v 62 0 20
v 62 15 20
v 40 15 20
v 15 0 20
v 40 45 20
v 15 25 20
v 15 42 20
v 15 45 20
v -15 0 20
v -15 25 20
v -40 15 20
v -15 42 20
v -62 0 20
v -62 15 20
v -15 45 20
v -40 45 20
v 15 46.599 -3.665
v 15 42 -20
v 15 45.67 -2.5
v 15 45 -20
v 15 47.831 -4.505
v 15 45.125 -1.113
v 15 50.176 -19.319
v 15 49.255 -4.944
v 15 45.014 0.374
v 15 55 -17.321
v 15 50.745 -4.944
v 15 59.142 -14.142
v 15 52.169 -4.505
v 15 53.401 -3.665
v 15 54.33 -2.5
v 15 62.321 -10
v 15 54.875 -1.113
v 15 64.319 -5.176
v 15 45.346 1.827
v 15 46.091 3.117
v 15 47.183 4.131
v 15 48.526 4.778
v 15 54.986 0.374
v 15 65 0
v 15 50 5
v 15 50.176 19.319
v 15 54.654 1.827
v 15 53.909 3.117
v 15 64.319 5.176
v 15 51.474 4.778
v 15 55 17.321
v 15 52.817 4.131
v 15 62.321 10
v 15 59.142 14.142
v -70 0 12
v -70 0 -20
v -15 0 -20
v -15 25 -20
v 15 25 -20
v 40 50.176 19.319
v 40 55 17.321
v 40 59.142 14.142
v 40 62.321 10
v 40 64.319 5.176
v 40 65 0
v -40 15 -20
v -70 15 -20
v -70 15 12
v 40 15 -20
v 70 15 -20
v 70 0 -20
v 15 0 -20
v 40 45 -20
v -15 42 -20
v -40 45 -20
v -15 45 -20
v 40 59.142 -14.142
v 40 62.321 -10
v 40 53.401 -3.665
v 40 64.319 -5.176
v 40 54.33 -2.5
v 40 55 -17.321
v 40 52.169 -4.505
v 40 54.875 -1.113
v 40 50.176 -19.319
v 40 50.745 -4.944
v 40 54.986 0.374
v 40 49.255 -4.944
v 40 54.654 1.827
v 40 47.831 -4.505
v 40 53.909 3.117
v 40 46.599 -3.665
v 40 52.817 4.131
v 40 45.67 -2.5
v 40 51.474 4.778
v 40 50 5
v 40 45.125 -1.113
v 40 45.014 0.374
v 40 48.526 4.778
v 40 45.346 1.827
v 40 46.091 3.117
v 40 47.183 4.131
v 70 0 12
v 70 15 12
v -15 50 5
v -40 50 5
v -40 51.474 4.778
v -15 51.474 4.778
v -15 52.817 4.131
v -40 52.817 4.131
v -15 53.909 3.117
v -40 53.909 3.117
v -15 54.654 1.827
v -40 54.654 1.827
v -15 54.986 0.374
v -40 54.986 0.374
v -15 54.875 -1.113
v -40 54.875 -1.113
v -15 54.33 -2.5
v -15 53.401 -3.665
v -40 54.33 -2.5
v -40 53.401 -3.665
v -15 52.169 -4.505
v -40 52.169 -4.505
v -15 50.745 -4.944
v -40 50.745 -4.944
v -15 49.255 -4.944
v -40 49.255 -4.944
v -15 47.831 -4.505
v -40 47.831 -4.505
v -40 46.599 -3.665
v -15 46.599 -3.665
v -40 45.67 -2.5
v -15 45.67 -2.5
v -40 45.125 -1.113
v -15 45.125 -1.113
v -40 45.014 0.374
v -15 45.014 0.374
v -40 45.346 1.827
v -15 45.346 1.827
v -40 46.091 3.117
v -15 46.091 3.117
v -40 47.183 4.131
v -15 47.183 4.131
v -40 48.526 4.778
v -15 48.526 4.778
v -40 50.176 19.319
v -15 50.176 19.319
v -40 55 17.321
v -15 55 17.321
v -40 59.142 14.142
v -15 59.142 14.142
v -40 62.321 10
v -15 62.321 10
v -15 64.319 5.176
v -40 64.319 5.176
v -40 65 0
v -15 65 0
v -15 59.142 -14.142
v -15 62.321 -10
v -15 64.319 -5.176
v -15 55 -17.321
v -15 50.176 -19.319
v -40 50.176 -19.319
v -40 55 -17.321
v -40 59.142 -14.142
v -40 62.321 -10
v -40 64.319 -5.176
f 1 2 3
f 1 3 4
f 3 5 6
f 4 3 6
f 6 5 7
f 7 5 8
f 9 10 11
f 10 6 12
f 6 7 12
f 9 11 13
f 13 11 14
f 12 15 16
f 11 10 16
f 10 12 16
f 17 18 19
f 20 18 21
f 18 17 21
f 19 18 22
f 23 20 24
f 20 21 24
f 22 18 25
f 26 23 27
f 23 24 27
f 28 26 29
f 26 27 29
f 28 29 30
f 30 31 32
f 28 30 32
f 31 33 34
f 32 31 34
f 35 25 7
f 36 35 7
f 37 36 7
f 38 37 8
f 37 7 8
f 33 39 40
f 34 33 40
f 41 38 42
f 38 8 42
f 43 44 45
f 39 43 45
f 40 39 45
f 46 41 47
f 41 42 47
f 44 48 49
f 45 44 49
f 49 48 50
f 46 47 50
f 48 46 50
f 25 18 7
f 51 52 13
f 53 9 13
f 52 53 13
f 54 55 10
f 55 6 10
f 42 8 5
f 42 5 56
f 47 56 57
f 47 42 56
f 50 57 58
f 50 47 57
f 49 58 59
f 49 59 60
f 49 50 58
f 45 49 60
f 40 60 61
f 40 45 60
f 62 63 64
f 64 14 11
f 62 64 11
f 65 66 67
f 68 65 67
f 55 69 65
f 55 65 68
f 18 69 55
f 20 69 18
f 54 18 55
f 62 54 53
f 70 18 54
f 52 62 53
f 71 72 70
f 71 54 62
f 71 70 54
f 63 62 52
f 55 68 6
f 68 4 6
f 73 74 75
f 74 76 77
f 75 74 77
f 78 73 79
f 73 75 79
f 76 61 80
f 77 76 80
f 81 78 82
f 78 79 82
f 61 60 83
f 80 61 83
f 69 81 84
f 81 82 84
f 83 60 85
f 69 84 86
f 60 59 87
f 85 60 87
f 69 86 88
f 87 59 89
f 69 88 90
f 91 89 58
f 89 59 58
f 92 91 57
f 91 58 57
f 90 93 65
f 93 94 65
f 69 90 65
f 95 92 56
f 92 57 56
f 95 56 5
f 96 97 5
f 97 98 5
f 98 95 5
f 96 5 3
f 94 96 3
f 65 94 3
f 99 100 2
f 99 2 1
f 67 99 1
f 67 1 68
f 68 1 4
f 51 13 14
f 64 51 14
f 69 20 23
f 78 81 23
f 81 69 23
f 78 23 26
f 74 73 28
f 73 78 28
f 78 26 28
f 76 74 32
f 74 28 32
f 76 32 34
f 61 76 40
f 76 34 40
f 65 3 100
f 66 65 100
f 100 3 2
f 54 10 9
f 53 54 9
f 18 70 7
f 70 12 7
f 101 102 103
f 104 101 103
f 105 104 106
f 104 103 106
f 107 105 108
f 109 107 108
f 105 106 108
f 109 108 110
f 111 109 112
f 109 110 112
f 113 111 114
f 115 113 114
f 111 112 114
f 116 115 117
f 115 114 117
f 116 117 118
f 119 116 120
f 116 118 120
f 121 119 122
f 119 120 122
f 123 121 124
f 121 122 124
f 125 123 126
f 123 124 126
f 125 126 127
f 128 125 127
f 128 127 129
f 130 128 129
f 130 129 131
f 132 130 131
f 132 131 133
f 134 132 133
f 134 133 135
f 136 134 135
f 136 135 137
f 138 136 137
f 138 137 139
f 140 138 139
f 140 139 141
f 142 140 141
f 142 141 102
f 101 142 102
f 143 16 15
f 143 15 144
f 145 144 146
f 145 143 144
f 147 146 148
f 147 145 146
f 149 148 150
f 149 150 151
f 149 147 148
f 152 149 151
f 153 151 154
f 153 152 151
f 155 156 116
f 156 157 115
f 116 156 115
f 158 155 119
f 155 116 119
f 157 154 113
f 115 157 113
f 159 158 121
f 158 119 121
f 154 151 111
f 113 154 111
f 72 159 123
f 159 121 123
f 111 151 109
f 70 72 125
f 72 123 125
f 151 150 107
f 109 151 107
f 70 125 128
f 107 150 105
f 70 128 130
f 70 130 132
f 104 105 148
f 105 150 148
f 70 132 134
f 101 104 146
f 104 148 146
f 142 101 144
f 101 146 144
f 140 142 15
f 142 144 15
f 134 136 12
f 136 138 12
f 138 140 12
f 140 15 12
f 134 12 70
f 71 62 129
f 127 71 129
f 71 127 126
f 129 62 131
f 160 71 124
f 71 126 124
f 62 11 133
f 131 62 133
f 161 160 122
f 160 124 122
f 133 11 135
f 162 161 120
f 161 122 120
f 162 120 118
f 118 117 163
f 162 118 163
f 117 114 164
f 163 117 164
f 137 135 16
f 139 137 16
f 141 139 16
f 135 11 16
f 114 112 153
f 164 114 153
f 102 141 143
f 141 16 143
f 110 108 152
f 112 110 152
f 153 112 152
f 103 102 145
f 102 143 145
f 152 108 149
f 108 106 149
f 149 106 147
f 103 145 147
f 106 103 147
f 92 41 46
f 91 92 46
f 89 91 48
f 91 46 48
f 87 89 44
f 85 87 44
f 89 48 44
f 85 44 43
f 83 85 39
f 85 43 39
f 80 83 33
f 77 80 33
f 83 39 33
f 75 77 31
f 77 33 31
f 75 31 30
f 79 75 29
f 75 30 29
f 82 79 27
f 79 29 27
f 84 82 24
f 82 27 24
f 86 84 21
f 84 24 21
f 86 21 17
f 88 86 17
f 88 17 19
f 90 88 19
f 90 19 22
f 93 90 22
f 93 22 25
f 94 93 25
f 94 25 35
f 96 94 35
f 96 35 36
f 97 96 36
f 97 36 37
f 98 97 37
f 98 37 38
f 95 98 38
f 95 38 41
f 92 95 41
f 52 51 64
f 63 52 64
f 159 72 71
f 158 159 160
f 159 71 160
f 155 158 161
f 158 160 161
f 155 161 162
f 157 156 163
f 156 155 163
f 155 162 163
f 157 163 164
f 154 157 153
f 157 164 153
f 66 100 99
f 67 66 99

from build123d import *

# Parameters (mm, degrees)
BOSS_EXTRUDE1_DEPTH = 20
CUT_EXTRUDE1_DEPTH  = 130.325171564
HOLE1_D             = 10
CHAMFER1_SIZE       = 8


with BuildPart() as part:
    # Sketch1 → Boss-Extrude1 (new, symmetric)
    with BuildSketch(Plane.XY):
        Polygon((-70, 0), (-70, 15), (-40, 15), (-40, 65), (-15, 65), (-15, 42), (15, 42), (15, 65), (40, 65), (40, 15), (70, 15), (70, 0), (15, 0), (15, 25), (-15, 25), (-15, 0), align=None)
    extrude(amount=BOSS_EXTRUDE1_DEPTH, both=True)

    # Sketch2 → Cut-Extrude1 (cut, through all)
    with BuildSketch(Plane.ZY.offset(40)):
        with BuildLine():
            Line((-20, 65), (-20, 45))
            ThreePointArc((-20, 45), (-14.142135624, 59.142135624), (0, 65))
            Line((0, 65), (-20, 65))
        make_face()
    cut_extrude1 = extrude(amount=-CUT_EXTRUDE1_DEPTH, mode=Mode.SUBTRACT)

    # Mirror1: Cut-Extrude1 across plane
    add(cut_extrude1.mirror(Plane.XY), mode=Mode.SUBTRACT)

    # Hole1 (through all)
    with Locations(Plane(origin=(40, 0, 0), x_dir=(0, 0, -1), z_dir=(1, 0, 0))):
        with Locations((0, 50)):
            Hole(HOLE1_D / 2)

    # Chamfer1
    chamfer1_edges = [part.edges().sort_by_distance(p)[0] for p in [
        (70, 7.5, 20),
        (-70, 7.5, 20),
    ]]
    chamfer(chamfer1_edges, length=CHAMFER1_SIZE)


solid = part.part
